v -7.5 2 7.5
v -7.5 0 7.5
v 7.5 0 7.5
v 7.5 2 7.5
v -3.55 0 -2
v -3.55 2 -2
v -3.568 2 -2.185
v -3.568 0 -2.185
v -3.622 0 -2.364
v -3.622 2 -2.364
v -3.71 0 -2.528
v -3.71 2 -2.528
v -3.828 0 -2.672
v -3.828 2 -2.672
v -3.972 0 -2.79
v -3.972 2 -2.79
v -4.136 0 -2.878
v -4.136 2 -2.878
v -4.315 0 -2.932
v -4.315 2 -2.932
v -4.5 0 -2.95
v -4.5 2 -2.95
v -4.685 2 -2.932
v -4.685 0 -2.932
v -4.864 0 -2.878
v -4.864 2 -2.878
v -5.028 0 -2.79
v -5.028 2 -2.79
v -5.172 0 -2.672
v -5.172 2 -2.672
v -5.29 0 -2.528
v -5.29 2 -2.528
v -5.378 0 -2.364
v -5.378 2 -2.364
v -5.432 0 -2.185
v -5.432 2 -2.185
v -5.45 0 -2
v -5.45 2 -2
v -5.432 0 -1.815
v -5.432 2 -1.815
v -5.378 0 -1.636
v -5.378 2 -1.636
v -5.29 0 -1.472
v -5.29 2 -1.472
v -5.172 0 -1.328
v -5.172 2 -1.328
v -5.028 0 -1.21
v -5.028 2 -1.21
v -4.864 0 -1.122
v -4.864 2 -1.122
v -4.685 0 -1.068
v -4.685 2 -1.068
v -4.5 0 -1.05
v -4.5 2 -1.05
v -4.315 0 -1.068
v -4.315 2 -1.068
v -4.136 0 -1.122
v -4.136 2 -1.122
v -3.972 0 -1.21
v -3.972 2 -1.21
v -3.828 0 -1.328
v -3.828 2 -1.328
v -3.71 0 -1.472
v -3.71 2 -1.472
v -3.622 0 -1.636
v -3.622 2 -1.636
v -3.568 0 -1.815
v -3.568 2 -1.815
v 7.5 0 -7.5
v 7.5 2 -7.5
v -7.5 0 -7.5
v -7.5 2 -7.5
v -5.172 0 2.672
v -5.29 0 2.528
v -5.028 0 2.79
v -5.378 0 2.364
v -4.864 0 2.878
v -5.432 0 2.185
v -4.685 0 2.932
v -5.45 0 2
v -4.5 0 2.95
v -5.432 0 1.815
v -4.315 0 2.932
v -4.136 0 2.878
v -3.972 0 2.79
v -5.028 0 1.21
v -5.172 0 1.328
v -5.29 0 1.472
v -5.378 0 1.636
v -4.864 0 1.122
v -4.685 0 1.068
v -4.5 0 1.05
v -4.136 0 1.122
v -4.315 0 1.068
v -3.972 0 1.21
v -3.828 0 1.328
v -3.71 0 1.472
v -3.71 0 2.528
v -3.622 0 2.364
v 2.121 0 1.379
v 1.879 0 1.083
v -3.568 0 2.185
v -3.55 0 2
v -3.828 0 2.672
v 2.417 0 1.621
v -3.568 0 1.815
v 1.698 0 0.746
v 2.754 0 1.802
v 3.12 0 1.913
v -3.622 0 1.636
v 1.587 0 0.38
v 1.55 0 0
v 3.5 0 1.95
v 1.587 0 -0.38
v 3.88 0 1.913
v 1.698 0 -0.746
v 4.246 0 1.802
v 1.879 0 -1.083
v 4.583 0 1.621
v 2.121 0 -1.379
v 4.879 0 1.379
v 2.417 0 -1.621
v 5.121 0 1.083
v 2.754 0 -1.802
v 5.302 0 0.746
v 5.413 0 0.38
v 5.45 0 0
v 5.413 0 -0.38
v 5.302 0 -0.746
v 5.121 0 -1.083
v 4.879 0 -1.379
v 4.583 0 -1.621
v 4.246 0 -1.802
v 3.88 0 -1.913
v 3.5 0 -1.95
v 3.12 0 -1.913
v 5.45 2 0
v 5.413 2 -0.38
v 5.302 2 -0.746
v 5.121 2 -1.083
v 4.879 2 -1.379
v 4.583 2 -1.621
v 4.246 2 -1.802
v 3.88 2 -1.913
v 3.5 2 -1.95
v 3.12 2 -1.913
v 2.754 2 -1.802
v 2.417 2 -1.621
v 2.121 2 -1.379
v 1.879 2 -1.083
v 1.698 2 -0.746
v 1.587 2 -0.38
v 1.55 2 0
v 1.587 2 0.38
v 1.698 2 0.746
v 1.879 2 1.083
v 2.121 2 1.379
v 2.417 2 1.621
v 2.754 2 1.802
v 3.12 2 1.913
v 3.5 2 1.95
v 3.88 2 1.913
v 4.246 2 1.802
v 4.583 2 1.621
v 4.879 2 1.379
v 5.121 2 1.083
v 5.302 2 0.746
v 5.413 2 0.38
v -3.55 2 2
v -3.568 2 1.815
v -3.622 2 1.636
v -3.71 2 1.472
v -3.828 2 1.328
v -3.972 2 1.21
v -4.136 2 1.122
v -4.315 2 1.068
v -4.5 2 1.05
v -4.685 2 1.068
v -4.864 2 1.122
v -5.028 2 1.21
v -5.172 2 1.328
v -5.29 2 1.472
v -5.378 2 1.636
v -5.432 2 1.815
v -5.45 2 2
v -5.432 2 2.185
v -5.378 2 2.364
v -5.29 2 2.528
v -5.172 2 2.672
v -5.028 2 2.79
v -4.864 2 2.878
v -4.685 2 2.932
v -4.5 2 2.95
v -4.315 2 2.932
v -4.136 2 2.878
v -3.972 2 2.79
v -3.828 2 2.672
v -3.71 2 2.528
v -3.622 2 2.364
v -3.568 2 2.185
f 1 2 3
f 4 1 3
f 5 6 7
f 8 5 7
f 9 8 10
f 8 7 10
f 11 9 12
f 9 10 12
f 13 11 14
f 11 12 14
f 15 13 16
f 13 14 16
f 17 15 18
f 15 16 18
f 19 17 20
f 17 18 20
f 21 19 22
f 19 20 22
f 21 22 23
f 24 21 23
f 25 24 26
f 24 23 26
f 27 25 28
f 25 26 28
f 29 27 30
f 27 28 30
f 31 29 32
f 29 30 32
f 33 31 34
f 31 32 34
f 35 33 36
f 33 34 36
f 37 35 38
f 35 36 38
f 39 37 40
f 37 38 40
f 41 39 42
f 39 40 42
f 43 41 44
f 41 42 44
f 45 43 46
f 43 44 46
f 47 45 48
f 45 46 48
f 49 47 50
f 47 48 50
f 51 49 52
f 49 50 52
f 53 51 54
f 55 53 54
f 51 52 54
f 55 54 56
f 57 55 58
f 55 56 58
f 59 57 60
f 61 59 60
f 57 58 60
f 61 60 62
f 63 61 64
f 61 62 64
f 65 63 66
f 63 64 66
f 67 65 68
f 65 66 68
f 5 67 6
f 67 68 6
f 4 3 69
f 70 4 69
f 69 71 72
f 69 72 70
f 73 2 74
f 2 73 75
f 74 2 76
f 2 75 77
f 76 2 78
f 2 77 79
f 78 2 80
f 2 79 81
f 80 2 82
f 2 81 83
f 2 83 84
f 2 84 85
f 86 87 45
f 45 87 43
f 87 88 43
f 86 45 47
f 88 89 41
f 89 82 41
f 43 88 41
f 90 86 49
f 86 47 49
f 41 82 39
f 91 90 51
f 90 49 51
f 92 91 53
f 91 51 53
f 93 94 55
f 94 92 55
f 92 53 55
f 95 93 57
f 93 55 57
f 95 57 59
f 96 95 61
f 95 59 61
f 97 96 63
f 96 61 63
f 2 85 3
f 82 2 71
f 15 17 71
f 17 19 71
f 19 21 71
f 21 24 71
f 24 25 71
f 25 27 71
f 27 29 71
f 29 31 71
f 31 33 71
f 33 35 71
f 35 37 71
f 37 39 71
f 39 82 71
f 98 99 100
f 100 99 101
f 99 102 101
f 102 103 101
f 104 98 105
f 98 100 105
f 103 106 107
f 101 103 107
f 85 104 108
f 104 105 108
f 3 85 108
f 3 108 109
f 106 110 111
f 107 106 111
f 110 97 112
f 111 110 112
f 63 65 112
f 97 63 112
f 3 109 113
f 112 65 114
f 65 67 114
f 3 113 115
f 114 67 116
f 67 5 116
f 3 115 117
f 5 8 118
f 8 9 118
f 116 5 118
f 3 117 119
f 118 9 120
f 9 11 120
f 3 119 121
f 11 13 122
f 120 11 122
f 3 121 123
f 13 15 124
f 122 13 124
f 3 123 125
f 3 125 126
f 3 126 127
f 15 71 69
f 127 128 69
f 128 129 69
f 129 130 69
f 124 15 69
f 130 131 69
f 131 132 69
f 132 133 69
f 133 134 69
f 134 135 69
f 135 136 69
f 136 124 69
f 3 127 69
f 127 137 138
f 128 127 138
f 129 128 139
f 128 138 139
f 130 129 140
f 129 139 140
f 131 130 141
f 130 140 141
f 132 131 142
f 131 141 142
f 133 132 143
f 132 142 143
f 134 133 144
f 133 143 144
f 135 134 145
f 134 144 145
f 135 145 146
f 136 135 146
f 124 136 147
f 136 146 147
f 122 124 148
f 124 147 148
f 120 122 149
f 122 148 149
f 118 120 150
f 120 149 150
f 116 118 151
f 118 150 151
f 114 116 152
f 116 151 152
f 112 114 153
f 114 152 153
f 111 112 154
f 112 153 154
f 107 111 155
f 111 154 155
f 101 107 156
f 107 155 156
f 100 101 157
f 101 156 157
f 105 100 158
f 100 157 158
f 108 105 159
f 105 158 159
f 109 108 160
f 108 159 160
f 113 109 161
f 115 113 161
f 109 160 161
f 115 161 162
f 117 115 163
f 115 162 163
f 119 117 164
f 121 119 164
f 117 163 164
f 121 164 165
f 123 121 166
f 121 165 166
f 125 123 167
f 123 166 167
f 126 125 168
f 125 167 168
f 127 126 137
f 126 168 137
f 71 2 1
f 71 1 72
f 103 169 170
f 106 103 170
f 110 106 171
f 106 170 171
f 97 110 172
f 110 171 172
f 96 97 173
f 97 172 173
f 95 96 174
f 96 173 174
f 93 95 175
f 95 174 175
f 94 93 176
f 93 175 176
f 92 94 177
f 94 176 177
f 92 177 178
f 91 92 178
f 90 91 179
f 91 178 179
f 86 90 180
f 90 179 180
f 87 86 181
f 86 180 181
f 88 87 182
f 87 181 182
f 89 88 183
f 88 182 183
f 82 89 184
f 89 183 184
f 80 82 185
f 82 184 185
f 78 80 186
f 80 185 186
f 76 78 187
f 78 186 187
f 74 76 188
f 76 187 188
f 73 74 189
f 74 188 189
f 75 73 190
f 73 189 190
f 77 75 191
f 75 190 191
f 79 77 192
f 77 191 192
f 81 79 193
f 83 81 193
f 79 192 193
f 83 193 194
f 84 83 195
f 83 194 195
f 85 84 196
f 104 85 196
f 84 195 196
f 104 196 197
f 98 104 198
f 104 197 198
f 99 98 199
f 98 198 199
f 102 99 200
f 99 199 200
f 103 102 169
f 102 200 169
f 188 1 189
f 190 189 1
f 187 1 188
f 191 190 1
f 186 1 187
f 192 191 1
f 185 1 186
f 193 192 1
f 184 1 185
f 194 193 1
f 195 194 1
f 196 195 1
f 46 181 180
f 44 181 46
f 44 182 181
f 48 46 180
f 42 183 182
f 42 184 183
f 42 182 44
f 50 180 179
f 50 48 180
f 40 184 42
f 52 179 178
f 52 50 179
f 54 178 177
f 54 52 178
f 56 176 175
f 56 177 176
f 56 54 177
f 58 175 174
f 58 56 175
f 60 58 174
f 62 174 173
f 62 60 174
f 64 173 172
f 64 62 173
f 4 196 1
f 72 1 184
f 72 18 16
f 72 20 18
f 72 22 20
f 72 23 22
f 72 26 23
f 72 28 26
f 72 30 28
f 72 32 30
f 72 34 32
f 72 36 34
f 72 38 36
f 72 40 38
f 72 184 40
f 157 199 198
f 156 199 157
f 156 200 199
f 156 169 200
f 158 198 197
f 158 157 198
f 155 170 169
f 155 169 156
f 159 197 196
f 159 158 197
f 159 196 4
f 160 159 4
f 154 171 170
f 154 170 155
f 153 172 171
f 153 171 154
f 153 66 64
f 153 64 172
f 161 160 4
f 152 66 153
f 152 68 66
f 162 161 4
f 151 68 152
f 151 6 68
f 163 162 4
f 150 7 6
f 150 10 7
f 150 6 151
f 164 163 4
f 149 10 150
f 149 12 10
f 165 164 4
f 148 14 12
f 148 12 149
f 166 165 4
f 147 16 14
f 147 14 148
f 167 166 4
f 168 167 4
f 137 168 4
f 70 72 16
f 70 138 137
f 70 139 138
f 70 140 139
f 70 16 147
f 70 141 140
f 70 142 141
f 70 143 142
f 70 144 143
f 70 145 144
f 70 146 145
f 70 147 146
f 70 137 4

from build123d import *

# Parameters (mm, degrees)
SKETCH2_W           = 15
SKETCH2_H           = 15
BOSS_EXTRUDE1_DEPTH = 2
SKETCH3_R           = 0.95
CUT_EXTRUDE1_DEPTH  = 2
SKETCH4_R           = 1.95
CUT_EXTRUDE2_DEPTH  = 2


with BuildPart() as part:
    # Sketch2 → Boss-Extrude1 (new body)
    with BuildSketch(Plane(origin=(0, 0, 0), x_dir=(1, 0, 0), z_dir=(0, 1, 0))):
        Rectangle(SKETCH2_W, SKETCH2_H)
    extrude(amount=BOSS_EXTRUDE1_DEPTH)

    # Sketch3 → Cut-Extrude1 (cut)
    with BuildSketch(Plane(origin=(0, 2, 0), x_dir=(1, 0, 0), z_dir=(0, 1, 0))):
        with Locations((-4.5, -2)):
            Circle(SKETCH3_R)
        with Locations((-4.5, 2)):
            Circle(SKETCH3_R)
    extrude(amount=-CUT_EXTRUDE1_DEPTH, mode=Mode.SUBTRACT)

    # Sketch4 → Cut-Extrude2 (cut)
    with BuildSketch(Plane(origin=(0, 2, 0), x_dir=(1, 0, 0), z_dir=(0, 1, 0))):
        with Locations((3.5, 0)):
            Circle(SKETCH4_R)
    extrude(amount=-CUT_EXTRUDE2_DEPTH, mode=Mode.SUBTRACT)


solid = part.part
